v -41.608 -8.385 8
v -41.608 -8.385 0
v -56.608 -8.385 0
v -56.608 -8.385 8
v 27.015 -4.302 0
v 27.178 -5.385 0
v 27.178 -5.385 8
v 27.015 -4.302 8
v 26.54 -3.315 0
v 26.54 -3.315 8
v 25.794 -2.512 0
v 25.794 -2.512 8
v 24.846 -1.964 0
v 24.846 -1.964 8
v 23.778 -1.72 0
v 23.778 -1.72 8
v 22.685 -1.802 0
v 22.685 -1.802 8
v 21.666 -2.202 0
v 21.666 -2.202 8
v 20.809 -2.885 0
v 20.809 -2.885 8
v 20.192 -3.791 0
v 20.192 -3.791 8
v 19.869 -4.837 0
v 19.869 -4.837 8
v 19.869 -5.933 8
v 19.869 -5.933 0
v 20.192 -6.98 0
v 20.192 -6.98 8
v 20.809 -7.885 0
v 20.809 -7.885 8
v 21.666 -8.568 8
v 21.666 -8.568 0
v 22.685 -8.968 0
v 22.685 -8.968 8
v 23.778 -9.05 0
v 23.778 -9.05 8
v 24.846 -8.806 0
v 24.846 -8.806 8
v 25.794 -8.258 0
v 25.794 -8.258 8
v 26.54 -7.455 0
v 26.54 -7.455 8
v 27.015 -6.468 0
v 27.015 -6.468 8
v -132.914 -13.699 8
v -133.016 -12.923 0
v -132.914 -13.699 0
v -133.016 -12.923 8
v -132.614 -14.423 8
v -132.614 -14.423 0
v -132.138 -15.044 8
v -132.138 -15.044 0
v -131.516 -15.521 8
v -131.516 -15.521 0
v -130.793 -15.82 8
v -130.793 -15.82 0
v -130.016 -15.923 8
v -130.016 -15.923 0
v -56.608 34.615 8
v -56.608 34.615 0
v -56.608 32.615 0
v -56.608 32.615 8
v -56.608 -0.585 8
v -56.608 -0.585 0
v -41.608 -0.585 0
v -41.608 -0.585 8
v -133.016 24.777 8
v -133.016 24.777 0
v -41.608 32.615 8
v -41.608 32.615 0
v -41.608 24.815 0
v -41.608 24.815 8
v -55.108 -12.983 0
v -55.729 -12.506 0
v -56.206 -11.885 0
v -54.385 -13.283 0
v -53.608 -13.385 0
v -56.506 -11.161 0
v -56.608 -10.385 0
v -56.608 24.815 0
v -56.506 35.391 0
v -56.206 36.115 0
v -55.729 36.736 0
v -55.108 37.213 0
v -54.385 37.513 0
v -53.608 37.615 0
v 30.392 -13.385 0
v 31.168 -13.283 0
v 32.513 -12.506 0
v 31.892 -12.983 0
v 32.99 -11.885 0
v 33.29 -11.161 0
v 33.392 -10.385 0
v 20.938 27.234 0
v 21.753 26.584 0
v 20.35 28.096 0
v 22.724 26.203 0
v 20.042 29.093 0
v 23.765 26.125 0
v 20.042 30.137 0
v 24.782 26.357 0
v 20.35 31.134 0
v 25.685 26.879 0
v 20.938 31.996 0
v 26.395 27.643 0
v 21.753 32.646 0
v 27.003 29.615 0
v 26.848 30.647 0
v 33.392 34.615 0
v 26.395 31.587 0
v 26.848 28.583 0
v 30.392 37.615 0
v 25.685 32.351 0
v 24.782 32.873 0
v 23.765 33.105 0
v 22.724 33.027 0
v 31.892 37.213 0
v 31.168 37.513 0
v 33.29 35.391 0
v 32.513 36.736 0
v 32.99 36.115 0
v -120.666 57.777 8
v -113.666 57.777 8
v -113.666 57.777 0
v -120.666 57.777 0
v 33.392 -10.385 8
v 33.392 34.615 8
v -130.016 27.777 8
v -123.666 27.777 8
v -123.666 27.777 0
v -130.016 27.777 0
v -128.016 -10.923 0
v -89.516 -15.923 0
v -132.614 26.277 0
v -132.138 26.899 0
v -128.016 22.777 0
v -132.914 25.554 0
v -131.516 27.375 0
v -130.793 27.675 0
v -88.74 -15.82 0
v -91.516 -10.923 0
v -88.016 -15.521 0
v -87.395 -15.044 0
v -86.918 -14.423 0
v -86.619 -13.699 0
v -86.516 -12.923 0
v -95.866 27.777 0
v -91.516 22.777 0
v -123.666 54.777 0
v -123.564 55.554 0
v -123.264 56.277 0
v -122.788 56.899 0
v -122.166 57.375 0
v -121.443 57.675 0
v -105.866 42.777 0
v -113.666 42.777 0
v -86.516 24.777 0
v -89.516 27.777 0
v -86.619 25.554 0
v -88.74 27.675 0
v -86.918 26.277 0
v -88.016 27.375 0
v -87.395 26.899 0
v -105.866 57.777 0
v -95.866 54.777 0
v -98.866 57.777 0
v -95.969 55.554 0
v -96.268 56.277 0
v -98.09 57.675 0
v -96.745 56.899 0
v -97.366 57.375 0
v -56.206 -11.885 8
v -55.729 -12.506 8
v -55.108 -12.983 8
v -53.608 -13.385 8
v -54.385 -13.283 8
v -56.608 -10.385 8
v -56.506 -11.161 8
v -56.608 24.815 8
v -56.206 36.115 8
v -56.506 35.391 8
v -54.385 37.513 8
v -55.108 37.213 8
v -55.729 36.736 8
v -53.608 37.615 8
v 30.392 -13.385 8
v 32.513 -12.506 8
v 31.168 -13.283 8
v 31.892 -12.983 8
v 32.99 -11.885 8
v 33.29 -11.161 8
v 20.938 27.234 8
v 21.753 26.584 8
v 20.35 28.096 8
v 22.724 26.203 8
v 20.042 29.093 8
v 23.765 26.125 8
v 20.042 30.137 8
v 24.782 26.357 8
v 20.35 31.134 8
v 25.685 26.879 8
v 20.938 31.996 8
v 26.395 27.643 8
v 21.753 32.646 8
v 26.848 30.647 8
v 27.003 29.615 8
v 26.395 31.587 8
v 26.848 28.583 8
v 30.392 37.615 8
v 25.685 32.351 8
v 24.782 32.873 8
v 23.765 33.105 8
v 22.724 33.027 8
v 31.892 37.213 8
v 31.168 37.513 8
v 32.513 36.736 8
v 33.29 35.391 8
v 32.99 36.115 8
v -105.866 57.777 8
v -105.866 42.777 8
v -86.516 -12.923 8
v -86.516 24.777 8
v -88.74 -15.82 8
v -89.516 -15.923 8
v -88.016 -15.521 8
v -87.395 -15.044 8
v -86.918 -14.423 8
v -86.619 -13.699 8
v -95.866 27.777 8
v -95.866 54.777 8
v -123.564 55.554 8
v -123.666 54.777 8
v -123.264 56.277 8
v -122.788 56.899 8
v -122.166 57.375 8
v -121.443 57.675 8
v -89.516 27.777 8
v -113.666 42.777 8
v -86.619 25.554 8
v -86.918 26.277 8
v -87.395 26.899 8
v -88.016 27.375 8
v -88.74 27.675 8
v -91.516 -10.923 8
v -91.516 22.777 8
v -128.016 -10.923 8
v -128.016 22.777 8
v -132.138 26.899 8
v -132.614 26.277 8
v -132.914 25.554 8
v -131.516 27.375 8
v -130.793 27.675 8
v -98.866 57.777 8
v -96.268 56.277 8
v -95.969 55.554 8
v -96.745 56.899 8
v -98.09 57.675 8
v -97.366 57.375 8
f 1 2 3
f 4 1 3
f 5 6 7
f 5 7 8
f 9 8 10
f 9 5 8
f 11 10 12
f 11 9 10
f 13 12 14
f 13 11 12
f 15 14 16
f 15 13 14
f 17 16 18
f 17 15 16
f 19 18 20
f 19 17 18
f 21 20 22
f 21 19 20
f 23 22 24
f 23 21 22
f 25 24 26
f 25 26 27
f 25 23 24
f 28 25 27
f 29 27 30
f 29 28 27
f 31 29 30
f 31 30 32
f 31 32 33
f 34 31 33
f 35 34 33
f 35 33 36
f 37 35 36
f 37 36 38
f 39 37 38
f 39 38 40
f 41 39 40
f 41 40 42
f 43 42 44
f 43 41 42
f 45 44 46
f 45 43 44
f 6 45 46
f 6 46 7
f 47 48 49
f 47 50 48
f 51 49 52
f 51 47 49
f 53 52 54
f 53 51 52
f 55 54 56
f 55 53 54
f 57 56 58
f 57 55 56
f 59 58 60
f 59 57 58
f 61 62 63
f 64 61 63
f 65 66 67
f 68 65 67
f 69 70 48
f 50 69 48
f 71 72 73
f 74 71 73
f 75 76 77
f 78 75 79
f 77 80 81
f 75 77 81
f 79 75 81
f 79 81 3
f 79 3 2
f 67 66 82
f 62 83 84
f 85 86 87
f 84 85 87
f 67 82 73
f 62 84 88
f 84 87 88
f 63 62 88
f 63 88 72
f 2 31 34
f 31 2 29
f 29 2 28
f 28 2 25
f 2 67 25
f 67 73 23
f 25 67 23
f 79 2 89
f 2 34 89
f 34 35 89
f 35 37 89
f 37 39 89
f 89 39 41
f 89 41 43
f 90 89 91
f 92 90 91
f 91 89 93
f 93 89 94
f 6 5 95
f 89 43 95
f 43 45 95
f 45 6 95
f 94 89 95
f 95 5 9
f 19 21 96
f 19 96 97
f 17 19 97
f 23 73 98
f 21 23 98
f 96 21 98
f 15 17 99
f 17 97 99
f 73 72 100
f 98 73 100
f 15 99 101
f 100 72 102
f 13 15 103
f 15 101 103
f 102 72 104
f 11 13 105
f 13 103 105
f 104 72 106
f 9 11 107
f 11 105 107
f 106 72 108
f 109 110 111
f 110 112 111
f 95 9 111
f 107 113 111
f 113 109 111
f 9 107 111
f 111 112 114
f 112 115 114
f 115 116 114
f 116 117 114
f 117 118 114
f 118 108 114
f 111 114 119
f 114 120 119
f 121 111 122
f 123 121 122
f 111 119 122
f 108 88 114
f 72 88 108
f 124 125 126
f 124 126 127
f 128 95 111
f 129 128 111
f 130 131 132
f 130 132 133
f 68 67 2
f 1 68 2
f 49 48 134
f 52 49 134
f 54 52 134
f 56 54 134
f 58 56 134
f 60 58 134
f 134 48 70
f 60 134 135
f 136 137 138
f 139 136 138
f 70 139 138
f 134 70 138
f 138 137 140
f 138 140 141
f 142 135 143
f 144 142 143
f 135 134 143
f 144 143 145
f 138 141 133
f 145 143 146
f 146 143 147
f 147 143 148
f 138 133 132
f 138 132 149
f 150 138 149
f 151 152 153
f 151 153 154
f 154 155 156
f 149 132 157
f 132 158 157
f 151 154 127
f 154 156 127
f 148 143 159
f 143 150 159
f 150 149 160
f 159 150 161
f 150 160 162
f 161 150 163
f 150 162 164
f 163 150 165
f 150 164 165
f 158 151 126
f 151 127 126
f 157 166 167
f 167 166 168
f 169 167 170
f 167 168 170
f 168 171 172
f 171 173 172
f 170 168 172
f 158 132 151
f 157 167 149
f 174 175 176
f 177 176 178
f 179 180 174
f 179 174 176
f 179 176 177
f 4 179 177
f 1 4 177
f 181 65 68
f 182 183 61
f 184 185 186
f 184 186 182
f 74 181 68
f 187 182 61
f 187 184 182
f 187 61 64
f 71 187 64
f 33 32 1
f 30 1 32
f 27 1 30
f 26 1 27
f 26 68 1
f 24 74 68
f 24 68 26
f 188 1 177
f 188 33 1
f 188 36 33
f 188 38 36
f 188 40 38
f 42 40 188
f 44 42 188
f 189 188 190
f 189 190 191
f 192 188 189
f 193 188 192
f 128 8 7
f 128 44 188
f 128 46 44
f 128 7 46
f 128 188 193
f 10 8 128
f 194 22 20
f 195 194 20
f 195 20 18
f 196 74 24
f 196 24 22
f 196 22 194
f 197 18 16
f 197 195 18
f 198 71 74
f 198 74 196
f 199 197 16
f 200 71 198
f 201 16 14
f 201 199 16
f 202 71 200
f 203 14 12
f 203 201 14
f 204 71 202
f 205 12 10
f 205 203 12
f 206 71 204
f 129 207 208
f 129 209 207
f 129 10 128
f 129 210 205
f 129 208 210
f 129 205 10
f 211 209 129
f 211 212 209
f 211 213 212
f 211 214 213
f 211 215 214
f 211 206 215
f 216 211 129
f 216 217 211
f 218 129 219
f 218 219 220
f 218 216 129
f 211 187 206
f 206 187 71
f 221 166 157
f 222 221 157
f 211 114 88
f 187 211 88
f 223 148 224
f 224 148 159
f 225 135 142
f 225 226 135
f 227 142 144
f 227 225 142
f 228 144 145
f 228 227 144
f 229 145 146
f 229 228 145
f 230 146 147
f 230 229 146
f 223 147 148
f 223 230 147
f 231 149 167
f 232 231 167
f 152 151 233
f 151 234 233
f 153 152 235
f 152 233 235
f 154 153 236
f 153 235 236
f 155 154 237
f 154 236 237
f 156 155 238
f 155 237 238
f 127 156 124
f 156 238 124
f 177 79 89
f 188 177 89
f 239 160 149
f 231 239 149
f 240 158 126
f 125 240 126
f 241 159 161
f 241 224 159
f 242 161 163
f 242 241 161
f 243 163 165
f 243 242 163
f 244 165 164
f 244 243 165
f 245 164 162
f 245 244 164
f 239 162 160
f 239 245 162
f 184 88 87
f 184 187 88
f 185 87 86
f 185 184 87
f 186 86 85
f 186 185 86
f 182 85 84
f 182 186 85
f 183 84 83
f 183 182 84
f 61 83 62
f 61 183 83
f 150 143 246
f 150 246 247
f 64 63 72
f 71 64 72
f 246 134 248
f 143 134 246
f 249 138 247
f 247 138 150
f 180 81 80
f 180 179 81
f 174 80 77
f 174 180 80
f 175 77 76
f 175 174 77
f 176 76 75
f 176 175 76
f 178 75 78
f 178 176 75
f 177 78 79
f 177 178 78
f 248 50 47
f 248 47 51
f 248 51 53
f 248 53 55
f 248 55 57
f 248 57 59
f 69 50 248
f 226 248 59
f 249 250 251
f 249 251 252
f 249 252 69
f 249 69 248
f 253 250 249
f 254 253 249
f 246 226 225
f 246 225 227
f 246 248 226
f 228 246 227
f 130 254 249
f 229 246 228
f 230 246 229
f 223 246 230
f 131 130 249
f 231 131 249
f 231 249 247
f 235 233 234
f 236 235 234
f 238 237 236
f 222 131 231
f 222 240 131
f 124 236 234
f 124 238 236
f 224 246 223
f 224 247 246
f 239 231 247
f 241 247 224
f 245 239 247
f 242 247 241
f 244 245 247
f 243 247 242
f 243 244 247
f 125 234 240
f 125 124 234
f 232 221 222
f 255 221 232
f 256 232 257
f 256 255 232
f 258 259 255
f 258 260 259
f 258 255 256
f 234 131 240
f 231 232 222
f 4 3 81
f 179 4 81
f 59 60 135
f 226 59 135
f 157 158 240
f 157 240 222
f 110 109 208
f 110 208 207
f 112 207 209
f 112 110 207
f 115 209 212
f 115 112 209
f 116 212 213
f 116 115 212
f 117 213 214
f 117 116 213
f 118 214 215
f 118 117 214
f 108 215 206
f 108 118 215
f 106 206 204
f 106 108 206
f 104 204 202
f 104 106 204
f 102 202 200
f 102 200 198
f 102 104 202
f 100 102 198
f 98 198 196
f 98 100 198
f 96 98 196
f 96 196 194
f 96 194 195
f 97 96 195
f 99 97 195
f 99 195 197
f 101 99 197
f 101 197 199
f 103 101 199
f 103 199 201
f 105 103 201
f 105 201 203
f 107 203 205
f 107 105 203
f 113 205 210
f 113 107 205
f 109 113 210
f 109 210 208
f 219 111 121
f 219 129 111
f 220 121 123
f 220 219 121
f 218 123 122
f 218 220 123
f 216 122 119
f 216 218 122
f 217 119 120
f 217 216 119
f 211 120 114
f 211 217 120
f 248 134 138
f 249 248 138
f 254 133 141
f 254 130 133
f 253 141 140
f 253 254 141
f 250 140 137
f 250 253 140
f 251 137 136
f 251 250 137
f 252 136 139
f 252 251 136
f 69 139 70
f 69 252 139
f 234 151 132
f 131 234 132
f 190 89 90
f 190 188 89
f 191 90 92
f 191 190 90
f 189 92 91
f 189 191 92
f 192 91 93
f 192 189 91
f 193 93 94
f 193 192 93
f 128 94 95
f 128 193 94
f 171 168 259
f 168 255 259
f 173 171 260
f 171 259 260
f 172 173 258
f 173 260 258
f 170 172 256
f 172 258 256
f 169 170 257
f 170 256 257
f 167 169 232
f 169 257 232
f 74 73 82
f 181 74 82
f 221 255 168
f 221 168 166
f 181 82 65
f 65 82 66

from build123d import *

# Parameters (mm, degrees)
F0_R     = 3.674937
F0_R_2   = 3.5
F1_DEPTH = 8
F0_W     = 7.8
F0_H     = 15
F0_W_2   = 36.5
F0_H_2   = 33.7
F2_DEPTH = 8
F3_R     = 3
F3_2_R   = 3


with BuildPart() as f1:
    # F0 (on Top) → F1 (new body)
    with BuildSketch(Plane.XY):
        Polygon((-56.608175, -8.385012), (-56.608175, -13.385012), (33.391825, -13.385012), (33.391825, 37.614988), (-56.608175, 37.614988), (-56.608175, 32.614988), (-41.608175, 32.614988), (-41.608175, 24.814988), (-56.608175, 24.814988), (-56.608175, -0.585012), (-41.608175, -0.585012), (-41.608175, -8.385012), align=None)
        with Locations((23.503186, -5.385012)):
            Circle(F0_R, mode=Mode.SUBTRACT)
        with Locations((23.503186, 29.614988)):
            Circle(F0_R_2, mode=Mode.SUBTRACT)
    extrude(amount=F1_DEPTH)

    # F3#2
    f3_2_edges = [f1.edges().sort_by_distance(p)[0] for p in [
        (33.391825, -13.385012, 4),
        (33.391825, 37.614988, 4),
        (-56.608175, -13.385012, 4),
        (-56.608175, 37.614988, 4),
    ]]
    fillet(f3_2_edges, radius=F3_2_R)


with BuildPart() as f2:
    # F0 (on Top) → F2 (new body)
    with BuildSketch(Plane.XY):
        Polygon((-123.66634, 57.777392), (-123.66634, 27.777392), (-113.66634, 27.777392), (-113.66634, 42.777392), (-113.66634, 57.777392), align=None)
        with Locations((-109.76634, 35.277392)):
            Rectangle(F0_W, F0_H)
        Polygon((-105.86634, 27.777392), (-95.86634, 27.777392), (-95.86634, 57.777392), (-105.86634, 57.777392), (-105.86634, 42.777392), align=None)
        Polygon((-133.01634, 27.777392), (-133.01634, -15.922608), (-86.51634, -15.922608), (-86.51634, 27.777392), (-95.86634, 27.777392), (-105.86634, 27.777392), (-113.66634, 27.777392), (-123.66634, 27.777392), align=None)
        with Locations((-109.76634, 5.927392)):
            Rectangle(F0_W_2, F0_H_2, mode=Mode.SUBTRACT)
    extrude(amount=F2_DEPTH)

    # F3
    f3_edges = [f2.edges().sort_by_distance(p)[0] for p in [
        (-133.01634, -15.922608, 4),
        (-86.51634, -15.922608, 4),
        (-86.51634, 27.777392, 4),
        (-133.01634, 27.777392, 4),
        (-95.86634, 57.777392, 4),
        (-123.66634, 57.777392, 4),
    ]]
    fillet(f3_edges, radius=F3_R)


solid = Compound([f1.part, f2.part])
